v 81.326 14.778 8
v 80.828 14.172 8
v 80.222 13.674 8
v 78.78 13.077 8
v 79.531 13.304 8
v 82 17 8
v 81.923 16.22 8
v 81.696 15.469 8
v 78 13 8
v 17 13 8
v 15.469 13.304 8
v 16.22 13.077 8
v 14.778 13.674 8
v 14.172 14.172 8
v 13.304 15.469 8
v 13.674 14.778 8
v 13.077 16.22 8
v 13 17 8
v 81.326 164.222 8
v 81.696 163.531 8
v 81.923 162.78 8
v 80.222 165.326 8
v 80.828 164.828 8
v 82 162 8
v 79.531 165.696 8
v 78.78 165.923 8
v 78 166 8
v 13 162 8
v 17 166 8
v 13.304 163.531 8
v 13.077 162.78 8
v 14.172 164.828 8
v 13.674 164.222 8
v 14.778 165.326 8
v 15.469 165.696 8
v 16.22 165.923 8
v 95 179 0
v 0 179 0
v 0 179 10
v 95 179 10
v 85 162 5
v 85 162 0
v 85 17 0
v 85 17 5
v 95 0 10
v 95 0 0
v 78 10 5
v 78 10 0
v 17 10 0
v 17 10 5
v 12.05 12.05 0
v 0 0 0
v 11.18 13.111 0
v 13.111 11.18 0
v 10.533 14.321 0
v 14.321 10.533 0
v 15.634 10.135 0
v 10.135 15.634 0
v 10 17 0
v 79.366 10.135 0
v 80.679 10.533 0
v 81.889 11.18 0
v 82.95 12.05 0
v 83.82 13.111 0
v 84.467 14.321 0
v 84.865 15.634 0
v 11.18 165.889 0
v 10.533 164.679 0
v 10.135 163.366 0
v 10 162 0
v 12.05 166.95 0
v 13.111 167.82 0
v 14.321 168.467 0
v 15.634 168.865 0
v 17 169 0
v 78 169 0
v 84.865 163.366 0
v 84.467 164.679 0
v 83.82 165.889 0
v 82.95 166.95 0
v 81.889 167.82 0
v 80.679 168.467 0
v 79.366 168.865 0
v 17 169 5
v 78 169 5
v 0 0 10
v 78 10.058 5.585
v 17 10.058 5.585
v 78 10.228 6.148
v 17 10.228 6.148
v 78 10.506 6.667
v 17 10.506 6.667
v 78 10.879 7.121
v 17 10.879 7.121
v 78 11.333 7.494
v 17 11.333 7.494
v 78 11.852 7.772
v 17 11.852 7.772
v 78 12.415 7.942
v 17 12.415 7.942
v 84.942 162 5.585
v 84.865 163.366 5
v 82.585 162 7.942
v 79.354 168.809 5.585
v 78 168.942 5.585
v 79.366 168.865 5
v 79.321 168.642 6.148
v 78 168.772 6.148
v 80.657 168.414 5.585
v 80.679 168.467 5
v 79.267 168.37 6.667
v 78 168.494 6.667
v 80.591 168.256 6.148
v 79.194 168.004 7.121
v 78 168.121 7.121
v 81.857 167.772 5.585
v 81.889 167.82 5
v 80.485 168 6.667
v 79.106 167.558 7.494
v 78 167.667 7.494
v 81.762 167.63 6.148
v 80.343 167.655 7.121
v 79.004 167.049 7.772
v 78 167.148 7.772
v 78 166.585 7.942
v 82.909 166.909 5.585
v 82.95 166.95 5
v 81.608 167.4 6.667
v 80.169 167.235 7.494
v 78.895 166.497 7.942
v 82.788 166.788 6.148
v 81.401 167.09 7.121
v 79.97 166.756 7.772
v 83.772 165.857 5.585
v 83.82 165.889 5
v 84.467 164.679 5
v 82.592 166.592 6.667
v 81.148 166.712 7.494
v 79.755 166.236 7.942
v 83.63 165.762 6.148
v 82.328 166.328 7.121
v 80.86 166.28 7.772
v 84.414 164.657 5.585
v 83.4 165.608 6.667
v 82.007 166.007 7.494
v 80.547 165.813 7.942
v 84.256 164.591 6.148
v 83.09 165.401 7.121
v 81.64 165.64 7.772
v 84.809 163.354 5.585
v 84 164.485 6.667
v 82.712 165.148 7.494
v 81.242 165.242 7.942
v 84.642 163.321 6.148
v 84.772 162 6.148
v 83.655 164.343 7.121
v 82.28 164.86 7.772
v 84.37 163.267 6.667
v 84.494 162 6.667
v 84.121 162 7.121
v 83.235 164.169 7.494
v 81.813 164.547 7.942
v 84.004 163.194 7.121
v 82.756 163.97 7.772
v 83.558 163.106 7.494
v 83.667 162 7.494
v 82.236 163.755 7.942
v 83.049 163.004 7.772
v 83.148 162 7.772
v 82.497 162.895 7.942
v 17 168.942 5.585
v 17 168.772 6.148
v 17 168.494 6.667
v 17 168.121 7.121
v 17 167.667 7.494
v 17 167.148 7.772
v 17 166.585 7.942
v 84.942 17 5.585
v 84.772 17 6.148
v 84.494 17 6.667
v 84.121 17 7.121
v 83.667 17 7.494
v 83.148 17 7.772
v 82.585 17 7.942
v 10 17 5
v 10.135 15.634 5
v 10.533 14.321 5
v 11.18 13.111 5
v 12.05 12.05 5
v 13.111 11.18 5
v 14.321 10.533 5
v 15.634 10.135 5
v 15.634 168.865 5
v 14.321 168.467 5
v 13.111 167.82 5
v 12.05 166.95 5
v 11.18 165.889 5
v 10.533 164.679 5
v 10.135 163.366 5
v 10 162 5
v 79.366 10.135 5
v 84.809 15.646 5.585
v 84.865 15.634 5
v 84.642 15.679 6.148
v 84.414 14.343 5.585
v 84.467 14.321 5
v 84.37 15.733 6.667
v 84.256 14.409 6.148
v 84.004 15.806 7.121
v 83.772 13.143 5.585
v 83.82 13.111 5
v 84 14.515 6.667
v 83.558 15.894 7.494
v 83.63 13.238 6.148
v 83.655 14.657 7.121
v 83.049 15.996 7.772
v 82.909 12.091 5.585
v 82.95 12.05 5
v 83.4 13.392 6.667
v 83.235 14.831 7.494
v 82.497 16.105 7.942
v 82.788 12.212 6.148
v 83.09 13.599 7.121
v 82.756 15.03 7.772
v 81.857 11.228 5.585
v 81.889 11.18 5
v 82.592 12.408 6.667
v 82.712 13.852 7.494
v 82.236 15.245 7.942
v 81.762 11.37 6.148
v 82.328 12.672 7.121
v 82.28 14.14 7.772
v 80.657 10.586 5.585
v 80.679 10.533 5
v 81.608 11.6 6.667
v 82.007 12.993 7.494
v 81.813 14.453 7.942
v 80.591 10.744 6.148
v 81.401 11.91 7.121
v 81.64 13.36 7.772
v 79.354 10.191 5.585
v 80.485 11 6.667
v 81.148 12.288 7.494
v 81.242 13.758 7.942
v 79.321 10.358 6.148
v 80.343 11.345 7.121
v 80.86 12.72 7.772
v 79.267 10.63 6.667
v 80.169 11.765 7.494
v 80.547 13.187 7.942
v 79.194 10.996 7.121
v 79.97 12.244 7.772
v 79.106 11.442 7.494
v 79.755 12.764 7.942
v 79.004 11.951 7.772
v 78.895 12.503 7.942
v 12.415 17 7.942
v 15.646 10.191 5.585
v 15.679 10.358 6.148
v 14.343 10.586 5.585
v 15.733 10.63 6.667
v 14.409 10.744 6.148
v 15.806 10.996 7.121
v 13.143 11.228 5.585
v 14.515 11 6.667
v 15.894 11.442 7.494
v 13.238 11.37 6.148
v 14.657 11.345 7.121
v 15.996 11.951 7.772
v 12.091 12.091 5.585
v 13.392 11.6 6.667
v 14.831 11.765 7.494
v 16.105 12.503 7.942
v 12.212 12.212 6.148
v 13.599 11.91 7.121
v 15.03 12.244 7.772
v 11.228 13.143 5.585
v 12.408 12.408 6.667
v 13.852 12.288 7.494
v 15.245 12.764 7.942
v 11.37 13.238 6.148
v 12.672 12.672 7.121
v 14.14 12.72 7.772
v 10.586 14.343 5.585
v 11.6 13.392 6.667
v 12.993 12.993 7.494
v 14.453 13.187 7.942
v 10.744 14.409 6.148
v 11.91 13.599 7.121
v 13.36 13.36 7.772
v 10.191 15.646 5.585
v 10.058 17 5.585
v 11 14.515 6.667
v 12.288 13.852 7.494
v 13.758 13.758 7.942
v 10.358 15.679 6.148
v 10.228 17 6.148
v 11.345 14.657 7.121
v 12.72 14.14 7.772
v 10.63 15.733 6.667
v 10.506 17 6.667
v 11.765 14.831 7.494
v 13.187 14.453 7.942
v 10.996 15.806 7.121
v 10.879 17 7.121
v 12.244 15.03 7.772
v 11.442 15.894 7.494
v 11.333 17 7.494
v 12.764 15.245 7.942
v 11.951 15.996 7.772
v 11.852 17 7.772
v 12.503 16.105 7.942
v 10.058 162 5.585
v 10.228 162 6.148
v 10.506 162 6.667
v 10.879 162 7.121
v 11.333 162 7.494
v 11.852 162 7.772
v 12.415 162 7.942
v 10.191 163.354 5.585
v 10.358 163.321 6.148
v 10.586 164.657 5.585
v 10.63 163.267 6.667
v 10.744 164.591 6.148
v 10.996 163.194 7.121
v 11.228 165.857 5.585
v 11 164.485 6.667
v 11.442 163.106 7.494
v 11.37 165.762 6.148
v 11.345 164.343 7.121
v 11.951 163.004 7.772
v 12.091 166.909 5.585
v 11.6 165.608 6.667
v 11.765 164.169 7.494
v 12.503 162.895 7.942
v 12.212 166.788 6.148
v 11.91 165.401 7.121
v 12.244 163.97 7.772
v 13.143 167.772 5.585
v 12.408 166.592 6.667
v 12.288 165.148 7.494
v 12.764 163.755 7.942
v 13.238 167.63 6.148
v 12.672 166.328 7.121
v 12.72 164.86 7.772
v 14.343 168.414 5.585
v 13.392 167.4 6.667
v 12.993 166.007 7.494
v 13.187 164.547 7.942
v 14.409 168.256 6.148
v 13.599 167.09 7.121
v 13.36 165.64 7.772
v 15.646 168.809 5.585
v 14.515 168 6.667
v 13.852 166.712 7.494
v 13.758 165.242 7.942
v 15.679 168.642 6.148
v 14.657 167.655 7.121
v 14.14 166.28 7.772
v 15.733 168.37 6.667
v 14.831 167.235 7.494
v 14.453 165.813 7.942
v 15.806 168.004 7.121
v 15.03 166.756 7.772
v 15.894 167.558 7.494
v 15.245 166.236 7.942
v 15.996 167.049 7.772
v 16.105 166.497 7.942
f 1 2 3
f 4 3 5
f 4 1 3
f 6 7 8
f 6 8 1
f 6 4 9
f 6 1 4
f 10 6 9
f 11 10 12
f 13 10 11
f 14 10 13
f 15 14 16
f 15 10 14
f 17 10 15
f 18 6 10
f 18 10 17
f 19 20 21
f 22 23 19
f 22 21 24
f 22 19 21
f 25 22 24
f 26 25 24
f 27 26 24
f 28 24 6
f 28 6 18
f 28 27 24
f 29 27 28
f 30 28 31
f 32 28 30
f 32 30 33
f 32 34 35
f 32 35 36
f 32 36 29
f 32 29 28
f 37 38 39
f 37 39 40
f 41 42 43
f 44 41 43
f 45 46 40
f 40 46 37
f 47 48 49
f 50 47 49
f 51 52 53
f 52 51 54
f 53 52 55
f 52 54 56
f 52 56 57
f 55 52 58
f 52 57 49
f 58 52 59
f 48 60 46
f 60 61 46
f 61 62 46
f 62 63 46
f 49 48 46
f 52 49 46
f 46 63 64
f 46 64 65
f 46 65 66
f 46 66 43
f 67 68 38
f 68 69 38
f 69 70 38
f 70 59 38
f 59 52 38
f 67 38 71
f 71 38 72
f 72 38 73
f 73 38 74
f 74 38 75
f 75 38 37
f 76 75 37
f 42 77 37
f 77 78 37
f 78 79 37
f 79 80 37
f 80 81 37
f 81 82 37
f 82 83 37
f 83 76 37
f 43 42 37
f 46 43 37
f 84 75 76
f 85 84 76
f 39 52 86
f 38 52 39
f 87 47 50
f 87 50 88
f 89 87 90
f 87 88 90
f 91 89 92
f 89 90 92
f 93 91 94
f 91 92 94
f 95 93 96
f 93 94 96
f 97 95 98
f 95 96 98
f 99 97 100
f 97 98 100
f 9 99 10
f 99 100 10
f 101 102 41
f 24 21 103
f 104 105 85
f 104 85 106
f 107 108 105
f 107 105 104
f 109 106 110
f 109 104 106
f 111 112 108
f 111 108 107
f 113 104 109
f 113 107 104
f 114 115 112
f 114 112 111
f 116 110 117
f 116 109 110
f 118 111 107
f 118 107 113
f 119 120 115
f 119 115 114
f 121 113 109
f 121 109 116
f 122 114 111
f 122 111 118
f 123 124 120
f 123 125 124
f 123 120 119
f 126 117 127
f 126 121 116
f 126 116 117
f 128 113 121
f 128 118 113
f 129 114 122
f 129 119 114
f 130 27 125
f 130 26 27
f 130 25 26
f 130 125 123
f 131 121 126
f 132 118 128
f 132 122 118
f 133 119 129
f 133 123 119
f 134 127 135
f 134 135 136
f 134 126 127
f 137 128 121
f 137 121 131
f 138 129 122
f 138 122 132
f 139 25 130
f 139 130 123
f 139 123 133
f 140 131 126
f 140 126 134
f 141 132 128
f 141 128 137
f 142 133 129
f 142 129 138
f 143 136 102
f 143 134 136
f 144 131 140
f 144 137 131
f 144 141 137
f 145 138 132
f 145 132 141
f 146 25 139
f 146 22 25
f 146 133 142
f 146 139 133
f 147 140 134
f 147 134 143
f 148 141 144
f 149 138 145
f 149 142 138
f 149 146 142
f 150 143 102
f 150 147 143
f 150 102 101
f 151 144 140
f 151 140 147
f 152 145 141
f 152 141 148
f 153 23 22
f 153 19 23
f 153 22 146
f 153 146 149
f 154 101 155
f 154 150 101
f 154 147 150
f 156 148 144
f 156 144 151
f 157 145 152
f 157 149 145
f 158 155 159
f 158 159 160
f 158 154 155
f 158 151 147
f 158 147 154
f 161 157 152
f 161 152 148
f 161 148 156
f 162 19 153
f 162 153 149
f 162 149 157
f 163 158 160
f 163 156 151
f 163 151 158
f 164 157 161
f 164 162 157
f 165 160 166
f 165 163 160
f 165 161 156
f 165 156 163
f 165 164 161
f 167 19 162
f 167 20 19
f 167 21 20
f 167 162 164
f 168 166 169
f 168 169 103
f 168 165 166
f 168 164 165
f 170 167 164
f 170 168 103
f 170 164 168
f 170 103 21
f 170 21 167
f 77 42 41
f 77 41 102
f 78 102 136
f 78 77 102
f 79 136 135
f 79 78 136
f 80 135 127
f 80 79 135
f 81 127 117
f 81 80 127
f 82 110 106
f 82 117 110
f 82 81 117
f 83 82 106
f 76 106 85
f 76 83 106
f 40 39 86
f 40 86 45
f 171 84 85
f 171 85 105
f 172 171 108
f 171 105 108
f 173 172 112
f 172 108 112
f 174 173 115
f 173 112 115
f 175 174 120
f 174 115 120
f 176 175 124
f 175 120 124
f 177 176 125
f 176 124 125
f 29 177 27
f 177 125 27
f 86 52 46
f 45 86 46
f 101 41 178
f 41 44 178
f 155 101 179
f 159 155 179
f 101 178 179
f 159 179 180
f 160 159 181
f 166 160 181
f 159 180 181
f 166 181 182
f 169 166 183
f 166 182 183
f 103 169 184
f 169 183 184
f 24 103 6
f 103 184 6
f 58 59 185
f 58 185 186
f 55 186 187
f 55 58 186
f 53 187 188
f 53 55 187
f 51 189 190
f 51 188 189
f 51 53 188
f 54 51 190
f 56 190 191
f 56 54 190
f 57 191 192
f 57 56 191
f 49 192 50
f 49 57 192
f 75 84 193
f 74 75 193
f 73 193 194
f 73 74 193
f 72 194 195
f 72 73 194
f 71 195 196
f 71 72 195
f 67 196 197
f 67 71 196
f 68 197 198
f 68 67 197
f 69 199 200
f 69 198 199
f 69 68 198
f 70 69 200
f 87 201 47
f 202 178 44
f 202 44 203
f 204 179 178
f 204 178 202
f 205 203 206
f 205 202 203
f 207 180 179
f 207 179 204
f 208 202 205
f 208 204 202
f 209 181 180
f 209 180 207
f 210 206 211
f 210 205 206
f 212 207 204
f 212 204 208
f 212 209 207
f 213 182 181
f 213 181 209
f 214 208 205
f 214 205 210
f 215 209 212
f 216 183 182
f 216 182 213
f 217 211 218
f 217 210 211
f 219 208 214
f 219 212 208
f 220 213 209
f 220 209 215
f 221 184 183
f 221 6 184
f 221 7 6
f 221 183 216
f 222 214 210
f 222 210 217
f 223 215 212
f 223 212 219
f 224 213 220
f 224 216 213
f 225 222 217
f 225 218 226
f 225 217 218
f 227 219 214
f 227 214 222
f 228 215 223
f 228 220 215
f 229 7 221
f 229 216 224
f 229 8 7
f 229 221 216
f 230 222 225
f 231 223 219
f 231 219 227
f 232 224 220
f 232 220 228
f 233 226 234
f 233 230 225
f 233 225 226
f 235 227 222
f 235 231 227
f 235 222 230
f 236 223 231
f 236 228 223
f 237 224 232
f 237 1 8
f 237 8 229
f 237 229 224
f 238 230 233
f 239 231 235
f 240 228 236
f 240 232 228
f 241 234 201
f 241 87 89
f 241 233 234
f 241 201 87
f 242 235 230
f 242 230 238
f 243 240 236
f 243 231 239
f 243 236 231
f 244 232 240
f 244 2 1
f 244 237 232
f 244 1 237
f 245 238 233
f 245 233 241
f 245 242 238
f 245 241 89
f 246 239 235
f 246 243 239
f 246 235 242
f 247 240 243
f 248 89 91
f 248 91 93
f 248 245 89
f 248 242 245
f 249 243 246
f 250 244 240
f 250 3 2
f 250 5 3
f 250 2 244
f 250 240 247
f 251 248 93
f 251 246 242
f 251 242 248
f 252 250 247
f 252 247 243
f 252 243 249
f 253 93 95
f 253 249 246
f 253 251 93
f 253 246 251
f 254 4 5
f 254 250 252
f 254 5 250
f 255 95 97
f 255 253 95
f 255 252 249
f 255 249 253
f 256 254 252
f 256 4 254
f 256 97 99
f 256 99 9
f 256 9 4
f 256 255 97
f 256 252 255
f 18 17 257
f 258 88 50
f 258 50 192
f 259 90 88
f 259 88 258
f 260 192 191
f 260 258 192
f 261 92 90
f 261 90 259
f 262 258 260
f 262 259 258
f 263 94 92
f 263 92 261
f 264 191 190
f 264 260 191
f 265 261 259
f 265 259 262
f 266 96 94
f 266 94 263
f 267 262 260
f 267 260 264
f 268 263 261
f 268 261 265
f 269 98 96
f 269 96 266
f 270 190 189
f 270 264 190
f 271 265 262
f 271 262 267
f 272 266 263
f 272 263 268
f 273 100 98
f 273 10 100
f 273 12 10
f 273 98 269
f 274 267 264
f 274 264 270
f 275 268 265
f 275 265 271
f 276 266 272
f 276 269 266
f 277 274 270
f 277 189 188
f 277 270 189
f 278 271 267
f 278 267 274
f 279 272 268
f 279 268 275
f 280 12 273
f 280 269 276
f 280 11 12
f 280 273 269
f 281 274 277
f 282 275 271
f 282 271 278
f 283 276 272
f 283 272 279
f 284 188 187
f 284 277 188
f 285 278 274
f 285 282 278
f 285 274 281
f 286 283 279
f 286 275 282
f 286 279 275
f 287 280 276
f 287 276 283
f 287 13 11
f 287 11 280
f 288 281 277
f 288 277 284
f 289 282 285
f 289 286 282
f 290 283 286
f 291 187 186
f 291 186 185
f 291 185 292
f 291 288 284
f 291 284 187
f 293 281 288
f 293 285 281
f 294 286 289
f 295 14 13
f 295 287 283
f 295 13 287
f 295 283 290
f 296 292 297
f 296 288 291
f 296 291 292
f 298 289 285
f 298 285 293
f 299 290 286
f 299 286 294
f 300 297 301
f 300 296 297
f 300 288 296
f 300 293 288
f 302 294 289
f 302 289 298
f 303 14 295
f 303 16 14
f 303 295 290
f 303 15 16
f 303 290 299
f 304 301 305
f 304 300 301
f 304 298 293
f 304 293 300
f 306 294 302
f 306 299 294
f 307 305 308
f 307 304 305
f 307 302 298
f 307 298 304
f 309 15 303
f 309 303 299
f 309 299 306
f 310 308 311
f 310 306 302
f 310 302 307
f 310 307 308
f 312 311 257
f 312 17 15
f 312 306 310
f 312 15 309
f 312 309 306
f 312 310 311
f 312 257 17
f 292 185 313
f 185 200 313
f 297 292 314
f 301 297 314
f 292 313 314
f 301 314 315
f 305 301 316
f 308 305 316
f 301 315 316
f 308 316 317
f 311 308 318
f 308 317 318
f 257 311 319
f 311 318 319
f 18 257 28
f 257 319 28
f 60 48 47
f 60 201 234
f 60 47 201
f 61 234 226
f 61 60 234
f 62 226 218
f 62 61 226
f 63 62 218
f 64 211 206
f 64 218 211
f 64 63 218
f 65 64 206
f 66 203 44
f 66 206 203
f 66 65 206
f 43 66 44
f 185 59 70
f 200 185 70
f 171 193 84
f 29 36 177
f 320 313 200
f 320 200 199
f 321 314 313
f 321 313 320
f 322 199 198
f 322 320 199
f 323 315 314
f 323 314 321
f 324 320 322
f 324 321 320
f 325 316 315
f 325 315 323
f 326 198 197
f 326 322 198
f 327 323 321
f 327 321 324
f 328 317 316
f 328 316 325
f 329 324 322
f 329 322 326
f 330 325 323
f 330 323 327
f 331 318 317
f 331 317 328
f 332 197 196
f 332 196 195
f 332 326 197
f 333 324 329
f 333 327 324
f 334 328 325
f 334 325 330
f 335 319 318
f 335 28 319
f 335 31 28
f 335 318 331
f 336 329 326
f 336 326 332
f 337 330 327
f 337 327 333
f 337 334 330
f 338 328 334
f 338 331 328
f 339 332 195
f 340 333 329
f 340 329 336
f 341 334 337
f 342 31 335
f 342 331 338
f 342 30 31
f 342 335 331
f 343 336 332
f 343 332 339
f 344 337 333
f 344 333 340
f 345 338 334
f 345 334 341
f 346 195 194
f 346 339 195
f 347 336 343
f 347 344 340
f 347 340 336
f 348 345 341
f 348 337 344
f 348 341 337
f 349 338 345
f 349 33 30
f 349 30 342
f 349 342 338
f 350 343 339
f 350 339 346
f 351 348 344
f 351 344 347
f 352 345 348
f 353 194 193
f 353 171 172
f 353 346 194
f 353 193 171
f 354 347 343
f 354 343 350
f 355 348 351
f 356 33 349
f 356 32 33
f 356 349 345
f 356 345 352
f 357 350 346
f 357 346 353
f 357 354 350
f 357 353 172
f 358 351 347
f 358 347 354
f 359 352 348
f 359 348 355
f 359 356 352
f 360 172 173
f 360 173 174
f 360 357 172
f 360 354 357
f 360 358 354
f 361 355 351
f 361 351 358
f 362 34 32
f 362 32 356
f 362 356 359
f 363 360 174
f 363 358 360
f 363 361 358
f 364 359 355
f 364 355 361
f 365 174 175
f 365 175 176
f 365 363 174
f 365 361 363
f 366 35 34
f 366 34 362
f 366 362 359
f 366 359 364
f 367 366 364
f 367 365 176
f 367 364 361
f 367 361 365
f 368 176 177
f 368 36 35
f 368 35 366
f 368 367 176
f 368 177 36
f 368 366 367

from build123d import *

# Parameters (mm, degrees)
SKETCH001_W  = 95
SKETCH001_H  = 179
PAD001_DEPTH = 10
POCKET_DEPTH = 8
FILLET_R     = 3


with BuildPart() as part:
    # Sketch001 → Pad001 (new body)
    with BuildSketch(Plane.XY):
        with Locations((47.5, 89.5)):
            Rectangle(SKETCH001_W, SKETCH001_H)
    extrude(amount=PAD001_DEPTH)

    # Sketch → Pocket (cut)
    with BuildSketch(Plane.XY):
        with BuildLine():
            Line((17, 169), (78, 169))
            ThreePointArc((85, 162), (82.949747, 166.949747), (78, 169))
            Line((85, 162), (85, 17))
            ThreePointArc((78, 10), (82.949747, 12.050253), (85, 17))
            Line((78, 10), (17, 10))
            ThreePointArc((10, 17), (12.050253, 12.050253), (17, 10))
            Line((10, 17), (10, 162))
            ThreePointArc((17, 169), (12.050253, 166.949747), (10, 162))
        make_face()
    extrude(amount=POCKET_DEPTH, mode=Mode.SUBTRACT)

    # Fillet
    fillet_edges = [part.edges().sort_by_distance(p)[0] for p in [
        (10, 89.5, 8),
    ]]
    fillet(fillet_edges, radius=FILLET_R)


solid = part.part
